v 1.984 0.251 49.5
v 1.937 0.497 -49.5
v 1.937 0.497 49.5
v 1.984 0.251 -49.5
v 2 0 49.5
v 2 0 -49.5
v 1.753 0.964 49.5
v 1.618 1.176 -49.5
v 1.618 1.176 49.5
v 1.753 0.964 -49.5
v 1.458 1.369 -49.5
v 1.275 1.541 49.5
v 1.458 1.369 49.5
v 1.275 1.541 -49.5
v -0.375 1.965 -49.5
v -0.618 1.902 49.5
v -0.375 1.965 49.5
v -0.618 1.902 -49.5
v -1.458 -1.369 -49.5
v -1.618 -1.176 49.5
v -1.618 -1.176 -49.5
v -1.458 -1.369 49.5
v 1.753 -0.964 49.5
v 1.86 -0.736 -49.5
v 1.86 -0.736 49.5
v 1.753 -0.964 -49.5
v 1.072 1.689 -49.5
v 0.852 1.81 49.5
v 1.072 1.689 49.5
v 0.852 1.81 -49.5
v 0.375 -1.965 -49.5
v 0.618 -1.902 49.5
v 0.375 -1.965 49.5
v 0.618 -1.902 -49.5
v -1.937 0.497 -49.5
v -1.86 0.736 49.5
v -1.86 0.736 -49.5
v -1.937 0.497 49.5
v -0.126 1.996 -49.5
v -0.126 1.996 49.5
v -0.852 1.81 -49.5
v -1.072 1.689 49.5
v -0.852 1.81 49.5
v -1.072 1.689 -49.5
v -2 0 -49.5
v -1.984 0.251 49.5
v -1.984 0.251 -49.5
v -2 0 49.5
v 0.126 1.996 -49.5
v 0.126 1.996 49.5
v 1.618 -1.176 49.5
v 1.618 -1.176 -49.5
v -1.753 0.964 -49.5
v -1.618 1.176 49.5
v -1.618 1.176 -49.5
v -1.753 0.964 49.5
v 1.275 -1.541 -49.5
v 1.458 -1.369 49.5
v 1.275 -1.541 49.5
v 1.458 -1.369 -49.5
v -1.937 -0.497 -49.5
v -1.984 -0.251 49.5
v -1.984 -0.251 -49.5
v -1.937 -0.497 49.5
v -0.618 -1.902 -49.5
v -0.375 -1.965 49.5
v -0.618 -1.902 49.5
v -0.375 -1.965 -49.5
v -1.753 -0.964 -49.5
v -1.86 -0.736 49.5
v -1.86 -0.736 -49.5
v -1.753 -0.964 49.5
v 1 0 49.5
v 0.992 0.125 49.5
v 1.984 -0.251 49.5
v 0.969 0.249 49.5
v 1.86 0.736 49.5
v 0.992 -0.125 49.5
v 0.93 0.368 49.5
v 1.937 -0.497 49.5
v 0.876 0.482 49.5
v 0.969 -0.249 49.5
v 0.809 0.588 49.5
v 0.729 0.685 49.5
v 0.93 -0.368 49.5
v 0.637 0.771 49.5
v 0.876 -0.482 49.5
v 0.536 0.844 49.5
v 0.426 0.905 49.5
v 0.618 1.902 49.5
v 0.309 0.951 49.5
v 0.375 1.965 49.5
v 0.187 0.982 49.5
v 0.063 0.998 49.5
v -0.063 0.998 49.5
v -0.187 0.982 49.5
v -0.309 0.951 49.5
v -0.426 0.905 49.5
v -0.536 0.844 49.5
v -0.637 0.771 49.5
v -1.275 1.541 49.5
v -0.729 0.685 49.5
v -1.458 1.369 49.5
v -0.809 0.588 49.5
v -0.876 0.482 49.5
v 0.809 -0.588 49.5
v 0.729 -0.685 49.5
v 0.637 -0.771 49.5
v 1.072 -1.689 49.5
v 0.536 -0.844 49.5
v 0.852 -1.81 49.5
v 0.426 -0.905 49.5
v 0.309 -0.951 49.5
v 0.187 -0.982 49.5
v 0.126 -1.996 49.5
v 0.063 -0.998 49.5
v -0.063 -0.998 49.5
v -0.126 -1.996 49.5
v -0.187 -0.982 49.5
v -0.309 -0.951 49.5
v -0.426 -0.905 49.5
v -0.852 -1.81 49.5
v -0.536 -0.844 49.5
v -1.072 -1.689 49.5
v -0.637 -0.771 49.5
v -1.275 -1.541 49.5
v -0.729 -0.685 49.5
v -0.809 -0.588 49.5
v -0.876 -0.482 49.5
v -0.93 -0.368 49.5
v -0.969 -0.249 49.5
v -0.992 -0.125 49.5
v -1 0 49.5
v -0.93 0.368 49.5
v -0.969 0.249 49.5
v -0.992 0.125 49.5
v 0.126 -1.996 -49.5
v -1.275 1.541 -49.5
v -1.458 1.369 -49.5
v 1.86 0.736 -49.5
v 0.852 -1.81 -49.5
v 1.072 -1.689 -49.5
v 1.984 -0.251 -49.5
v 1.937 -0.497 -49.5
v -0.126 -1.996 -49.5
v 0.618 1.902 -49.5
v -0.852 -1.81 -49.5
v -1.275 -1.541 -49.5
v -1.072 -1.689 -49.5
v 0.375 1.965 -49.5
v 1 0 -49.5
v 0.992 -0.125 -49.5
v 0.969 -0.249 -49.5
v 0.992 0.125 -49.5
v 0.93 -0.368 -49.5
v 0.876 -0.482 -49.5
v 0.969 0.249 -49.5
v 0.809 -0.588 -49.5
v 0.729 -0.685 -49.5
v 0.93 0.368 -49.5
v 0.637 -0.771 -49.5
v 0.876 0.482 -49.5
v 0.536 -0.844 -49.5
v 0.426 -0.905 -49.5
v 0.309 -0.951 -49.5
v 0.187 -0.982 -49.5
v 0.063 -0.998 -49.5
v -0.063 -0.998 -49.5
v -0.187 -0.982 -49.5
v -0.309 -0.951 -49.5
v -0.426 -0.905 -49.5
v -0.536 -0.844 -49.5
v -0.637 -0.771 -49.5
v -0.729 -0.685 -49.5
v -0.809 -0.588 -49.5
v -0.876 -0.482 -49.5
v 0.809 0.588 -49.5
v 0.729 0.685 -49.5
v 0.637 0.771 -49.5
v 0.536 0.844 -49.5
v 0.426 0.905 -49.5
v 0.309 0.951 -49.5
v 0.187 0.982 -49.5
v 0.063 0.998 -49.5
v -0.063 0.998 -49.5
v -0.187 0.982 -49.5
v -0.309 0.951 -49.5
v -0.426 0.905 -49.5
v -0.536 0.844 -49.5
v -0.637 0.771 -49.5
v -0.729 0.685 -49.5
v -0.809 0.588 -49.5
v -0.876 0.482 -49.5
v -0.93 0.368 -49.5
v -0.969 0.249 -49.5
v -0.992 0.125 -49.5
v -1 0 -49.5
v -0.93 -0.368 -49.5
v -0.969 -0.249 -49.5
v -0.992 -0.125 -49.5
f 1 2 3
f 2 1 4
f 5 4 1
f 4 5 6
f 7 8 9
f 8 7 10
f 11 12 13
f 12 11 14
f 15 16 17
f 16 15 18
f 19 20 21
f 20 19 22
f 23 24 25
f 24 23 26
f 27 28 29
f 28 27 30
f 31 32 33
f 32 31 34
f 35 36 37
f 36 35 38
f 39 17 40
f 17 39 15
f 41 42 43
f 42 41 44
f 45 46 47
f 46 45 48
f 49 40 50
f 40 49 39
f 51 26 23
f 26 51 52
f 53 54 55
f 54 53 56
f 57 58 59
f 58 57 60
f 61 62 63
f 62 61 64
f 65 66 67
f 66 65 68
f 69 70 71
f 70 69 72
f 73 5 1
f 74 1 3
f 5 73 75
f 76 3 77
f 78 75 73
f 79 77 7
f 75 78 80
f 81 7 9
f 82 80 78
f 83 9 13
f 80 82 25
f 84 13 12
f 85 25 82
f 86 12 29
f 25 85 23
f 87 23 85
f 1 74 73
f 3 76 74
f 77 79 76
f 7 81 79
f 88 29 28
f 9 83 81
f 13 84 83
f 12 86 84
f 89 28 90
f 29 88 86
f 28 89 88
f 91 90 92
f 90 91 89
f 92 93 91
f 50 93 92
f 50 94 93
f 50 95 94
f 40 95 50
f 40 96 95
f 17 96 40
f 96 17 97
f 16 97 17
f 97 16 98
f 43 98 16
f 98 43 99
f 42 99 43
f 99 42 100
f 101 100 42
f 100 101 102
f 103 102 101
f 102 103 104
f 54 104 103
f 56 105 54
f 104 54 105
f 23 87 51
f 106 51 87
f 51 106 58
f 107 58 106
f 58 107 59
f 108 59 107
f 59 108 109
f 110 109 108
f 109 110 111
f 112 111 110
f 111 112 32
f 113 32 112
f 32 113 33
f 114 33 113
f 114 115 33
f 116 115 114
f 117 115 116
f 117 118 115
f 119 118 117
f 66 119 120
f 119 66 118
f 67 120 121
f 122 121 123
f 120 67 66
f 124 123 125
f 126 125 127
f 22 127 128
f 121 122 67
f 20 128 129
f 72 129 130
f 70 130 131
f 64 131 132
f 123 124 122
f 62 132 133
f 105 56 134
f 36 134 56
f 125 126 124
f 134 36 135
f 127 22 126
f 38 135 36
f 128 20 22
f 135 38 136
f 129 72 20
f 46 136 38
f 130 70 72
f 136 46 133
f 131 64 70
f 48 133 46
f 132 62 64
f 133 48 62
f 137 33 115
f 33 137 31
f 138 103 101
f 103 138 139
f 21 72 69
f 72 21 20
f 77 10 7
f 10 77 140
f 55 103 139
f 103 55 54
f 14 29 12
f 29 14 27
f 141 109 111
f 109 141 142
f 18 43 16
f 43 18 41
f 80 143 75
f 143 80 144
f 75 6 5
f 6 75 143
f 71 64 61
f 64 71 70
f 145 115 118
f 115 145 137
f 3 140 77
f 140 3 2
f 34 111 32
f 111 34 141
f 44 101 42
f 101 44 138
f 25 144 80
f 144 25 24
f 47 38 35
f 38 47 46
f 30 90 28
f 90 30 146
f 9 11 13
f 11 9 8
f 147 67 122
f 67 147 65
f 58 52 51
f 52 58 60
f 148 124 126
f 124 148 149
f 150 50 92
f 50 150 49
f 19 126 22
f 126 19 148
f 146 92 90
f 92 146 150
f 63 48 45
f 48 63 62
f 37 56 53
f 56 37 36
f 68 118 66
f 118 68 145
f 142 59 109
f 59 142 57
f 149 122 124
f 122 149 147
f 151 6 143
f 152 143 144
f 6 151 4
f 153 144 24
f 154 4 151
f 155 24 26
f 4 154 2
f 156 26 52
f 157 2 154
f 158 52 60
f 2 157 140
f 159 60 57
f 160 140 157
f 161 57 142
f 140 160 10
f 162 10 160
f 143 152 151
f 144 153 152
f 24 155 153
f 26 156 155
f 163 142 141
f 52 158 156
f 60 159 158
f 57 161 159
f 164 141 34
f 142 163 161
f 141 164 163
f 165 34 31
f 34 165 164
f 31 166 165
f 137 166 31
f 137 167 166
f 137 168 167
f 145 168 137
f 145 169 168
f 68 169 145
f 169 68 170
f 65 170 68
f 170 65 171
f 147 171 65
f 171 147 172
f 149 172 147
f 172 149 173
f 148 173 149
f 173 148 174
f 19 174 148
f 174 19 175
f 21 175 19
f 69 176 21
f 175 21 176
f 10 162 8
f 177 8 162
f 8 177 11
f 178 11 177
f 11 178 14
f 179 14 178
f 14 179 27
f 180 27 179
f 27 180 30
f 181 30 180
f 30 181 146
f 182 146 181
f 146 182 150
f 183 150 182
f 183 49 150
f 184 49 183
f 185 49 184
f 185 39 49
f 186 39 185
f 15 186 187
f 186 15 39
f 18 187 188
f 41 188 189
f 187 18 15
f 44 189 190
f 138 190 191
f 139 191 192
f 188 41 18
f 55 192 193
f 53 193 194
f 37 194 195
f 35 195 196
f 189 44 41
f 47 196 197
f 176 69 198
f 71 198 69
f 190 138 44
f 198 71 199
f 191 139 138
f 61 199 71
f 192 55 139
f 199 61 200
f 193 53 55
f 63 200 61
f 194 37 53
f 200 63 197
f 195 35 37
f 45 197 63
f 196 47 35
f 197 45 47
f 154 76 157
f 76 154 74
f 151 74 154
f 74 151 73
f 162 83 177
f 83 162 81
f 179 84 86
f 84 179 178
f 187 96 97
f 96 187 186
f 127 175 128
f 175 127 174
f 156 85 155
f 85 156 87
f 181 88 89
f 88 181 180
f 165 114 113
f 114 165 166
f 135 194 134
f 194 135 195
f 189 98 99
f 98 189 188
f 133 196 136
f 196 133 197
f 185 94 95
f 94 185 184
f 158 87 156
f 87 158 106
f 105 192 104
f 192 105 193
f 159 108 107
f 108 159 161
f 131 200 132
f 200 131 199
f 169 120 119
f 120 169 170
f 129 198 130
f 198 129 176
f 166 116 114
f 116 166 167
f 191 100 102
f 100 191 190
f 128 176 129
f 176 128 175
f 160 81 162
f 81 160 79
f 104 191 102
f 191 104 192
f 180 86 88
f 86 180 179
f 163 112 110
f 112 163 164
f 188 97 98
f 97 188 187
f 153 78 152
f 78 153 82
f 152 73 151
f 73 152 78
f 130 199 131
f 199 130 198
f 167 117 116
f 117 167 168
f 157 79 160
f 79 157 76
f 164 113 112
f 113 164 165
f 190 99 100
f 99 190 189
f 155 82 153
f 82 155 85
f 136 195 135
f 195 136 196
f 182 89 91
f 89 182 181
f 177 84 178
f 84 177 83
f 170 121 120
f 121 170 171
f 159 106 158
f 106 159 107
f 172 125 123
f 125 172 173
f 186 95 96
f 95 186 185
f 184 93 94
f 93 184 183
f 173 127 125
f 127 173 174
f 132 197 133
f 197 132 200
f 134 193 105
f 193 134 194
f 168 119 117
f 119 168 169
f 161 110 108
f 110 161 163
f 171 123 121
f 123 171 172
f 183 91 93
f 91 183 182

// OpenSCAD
$fn = 50;


difference() {
	union() {
		translate(v = [0, 0, -49.5000000000]) {
			cylinder(h = 99, r = 2.0000000000);
		}
	}
	union() {
		translate(v = [0, 0, -100.0000000000]) {
			cylinder(h = 200, r = 1.0000000000);
		}
	}
}
